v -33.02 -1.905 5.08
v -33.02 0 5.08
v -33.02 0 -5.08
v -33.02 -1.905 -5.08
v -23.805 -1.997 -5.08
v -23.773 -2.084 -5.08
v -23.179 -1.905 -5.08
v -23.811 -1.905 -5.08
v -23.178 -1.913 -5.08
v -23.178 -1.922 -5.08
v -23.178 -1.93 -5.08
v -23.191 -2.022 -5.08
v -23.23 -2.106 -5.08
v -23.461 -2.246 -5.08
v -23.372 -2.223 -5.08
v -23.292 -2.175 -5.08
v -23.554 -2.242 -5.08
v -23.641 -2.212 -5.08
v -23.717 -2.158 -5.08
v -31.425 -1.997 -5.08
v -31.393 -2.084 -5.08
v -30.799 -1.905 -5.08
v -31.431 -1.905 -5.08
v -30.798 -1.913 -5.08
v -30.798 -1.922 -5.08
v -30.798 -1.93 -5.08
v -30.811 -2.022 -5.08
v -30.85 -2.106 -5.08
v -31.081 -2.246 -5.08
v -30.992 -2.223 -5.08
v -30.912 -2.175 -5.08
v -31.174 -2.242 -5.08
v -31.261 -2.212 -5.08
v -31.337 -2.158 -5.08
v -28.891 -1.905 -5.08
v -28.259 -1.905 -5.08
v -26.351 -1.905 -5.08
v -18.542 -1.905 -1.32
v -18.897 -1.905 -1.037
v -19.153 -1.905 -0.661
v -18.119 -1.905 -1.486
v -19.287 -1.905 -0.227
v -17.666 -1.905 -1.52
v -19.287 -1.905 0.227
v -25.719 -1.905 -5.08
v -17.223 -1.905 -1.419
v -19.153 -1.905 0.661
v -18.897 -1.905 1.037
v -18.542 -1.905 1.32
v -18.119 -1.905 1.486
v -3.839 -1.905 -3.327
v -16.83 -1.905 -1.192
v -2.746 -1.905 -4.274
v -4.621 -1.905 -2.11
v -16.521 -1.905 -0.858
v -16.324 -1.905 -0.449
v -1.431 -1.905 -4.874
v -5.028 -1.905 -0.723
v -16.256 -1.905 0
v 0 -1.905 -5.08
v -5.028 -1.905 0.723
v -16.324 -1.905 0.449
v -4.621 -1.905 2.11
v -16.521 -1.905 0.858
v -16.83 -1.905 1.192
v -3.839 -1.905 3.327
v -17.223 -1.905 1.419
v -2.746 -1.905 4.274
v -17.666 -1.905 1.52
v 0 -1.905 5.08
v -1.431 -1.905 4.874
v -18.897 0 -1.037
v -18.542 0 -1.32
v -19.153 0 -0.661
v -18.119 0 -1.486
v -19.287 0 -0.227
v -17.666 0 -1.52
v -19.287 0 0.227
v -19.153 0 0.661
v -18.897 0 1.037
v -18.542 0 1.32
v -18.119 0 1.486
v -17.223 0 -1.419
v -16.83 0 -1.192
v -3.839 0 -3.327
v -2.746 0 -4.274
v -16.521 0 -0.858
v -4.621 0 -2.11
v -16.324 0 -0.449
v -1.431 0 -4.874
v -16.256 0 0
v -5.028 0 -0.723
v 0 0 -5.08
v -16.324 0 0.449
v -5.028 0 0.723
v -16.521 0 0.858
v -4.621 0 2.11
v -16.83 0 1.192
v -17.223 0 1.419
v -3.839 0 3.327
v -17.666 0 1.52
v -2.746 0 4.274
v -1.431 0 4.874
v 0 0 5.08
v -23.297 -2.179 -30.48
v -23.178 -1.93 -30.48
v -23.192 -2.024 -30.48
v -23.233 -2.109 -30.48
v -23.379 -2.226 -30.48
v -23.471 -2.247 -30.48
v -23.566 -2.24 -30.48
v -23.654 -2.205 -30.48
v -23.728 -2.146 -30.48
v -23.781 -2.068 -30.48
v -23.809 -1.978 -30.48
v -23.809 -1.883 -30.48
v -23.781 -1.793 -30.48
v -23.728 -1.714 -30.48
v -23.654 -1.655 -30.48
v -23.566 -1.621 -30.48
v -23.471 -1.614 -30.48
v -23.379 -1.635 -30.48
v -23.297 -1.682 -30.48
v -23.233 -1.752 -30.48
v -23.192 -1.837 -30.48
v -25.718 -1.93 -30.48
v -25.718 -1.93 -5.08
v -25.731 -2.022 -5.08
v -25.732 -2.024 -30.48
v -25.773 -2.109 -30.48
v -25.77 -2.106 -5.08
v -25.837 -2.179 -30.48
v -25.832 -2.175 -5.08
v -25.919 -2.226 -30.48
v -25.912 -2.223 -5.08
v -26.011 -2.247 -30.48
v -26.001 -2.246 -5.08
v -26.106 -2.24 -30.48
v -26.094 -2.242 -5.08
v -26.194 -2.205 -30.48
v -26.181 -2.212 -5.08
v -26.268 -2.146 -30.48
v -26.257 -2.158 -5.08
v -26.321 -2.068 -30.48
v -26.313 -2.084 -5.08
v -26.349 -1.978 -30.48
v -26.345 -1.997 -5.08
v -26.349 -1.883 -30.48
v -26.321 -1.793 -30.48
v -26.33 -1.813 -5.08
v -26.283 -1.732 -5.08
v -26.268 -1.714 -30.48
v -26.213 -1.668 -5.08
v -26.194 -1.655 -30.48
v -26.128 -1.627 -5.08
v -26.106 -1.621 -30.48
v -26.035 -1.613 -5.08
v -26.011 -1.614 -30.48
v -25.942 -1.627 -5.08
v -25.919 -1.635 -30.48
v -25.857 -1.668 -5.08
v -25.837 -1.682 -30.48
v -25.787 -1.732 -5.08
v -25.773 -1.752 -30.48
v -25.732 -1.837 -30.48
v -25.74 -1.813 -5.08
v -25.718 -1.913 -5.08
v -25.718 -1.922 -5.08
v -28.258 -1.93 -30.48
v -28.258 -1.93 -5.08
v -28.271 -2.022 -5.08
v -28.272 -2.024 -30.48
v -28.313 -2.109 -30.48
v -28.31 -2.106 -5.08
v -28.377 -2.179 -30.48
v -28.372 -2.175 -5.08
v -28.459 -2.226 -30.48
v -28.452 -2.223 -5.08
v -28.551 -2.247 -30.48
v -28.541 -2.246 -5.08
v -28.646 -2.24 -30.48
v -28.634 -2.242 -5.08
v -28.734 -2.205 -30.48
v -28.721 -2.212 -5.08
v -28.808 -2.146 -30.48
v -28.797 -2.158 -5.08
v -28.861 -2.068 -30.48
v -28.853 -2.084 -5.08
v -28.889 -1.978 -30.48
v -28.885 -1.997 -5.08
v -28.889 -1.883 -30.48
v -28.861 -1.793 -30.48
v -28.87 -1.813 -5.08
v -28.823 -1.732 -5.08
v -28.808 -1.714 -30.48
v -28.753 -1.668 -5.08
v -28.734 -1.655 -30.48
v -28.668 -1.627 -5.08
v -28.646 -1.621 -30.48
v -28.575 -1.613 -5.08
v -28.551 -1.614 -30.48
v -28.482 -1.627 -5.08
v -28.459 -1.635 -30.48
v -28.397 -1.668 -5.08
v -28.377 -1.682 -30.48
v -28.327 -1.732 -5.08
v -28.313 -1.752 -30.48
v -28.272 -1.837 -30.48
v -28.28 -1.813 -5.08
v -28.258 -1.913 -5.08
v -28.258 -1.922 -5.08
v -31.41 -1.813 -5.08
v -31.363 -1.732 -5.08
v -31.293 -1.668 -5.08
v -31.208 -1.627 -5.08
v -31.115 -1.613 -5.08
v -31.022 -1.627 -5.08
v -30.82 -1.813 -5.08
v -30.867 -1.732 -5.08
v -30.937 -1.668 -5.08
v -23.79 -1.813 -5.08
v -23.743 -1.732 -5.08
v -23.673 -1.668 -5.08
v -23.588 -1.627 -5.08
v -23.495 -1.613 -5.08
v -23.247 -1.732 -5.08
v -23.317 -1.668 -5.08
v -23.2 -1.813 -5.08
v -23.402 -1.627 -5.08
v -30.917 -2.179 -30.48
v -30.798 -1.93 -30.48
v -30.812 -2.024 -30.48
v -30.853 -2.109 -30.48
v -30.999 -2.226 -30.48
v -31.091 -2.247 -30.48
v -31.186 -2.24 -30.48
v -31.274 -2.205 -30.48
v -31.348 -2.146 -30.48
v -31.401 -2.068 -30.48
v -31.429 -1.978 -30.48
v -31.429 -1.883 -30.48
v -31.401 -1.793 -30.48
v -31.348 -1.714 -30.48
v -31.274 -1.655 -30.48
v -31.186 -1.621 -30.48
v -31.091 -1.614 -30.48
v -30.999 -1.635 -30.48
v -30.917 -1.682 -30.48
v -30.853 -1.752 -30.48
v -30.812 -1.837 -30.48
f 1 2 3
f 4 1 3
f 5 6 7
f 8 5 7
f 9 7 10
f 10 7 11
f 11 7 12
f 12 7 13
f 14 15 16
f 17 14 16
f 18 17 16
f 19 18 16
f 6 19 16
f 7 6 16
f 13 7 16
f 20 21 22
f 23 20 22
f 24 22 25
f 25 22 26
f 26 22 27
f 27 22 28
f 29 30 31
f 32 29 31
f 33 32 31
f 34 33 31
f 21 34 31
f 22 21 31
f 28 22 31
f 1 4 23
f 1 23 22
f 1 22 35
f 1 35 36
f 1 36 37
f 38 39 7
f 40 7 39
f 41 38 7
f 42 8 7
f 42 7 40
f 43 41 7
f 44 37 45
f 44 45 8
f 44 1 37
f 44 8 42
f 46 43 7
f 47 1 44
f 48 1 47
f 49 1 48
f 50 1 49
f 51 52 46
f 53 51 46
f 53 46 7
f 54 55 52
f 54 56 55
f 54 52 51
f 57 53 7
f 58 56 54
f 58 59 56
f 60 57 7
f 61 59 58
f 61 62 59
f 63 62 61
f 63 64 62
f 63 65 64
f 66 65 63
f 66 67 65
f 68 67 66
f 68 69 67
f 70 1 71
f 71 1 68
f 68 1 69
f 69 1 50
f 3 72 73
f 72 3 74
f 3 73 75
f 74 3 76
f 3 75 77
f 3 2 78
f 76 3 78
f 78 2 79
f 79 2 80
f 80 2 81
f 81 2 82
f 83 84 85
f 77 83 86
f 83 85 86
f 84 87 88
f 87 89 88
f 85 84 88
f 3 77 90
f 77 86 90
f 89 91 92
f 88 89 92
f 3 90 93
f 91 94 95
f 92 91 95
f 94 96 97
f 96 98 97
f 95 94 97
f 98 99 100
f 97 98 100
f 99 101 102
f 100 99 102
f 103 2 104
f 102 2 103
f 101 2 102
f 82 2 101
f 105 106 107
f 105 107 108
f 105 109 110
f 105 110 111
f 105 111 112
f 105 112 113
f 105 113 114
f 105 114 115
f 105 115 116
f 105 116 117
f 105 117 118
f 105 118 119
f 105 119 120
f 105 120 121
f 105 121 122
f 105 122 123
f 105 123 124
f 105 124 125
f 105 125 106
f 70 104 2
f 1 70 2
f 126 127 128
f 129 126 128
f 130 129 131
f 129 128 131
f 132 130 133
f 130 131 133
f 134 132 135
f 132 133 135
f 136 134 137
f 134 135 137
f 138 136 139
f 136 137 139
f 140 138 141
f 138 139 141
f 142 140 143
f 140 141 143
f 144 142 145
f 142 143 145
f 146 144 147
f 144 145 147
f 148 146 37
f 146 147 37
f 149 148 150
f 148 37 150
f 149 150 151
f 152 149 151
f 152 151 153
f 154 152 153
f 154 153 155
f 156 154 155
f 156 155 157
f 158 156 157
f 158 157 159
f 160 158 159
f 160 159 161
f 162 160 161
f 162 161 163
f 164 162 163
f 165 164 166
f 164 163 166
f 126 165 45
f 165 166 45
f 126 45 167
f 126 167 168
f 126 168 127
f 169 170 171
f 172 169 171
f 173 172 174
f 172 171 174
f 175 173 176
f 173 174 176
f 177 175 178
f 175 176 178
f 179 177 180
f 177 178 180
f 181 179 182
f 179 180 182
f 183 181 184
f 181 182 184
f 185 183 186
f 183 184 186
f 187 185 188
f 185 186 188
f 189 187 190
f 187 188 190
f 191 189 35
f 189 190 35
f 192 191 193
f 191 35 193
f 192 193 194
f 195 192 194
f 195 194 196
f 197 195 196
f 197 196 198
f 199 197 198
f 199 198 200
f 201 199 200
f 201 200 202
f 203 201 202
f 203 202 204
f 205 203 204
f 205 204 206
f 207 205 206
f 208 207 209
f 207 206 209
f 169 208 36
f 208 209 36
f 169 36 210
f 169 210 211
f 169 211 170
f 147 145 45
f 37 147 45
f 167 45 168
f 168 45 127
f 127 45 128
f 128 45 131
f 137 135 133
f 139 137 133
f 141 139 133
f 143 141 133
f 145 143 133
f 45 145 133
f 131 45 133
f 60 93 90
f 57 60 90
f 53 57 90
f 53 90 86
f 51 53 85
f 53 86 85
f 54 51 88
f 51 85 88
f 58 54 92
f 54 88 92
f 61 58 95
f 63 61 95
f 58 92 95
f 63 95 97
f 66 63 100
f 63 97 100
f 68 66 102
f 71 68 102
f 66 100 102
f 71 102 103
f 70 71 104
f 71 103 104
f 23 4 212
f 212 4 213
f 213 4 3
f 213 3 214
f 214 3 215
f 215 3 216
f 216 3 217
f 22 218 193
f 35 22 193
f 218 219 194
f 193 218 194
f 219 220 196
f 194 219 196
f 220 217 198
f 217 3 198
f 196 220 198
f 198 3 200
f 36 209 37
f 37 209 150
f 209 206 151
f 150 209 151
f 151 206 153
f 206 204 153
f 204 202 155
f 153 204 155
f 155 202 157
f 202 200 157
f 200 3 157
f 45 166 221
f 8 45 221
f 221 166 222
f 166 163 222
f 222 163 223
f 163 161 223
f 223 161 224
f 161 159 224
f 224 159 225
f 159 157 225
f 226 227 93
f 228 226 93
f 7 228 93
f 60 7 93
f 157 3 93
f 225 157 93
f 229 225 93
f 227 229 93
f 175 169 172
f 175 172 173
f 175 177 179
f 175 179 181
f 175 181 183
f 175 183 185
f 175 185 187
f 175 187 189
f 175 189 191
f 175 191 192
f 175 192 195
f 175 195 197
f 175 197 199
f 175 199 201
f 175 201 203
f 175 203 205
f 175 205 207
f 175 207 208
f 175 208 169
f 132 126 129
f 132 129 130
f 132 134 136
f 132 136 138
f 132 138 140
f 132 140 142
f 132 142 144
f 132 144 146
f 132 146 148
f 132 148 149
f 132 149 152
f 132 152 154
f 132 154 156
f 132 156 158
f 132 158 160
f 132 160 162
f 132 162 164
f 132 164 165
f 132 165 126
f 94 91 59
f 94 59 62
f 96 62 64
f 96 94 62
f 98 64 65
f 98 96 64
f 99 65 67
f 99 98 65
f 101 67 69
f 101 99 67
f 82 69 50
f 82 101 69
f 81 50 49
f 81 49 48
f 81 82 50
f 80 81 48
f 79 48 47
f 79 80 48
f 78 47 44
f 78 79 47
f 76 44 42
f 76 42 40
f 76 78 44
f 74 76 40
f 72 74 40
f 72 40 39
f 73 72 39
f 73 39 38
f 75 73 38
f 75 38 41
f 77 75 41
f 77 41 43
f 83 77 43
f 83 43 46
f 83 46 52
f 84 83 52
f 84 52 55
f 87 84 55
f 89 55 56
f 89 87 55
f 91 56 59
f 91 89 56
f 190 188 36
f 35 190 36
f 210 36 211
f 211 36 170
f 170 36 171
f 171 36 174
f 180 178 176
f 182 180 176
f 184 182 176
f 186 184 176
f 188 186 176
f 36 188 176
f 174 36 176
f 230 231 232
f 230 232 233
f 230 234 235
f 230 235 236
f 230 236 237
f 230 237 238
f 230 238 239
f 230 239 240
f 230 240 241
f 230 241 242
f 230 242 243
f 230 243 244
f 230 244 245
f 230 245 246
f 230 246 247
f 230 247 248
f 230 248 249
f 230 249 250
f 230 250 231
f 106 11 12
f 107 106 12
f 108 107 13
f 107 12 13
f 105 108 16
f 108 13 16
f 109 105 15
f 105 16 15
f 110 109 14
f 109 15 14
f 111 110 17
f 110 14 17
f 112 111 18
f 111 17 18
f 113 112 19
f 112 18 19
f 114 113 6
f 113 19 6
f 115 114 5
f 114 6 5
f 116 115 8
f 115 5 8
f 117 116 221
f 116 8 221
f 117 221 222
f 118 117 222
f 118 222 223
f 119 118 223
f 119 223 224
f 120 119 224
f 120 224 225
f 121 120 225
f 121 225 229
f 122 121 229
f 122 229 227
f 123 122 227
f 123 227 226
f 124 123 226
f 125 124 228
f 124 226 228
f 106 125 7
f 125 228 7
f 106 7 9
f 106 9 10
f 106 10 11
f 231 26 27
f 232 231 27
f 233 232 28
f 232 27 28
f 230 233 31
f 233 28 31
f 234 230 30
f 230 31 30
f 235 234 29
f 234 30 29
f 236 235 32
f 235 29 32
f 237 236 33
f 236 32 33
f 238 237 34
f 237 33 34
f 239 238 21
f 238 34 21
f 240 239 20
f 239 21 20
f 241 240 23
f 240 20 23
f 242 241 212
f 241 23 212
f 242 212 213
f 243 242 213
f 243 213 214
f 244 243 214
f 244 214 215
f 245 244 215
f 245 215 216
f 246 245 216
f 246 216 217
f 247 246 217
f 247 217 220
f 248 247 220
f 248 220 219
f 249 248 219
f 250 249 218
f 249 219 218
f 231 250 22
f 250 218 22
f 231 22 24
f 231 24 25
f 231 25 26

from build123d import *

# Parameters (mm, degrees)
F0_R     = 1.524
F1_DEPTH = 1.905
F2_R     = 0.3175
F3_DEPTH = 25.4
F4_R     = 5.08
F5_DEPTH = 3.83728


with BuildPart() as f1:
    # F0 (on Front) → F1 (new body)
    with BuildSketch(Plane.XZ):
        with BuildLine():
            ThreePointArc((0, -5.08), (3.592102, -3.592102), (5.08, 0))
            ThreePointArc((5.08, 0), (3.592102, 3.592102), (0, 5.08))
            Line((0, 5.08), (0, -5.08))
        make_face()
        with BuildLine():
            ThreePointArc((0, -5.08), (-5.08, 0), (0, 5.08))
            Line((0, 5.08), (-33.02, 5.08))
            Line((-33.02, 5.08), (-33.02, -5.08))
            Line((-33.02, -5.08), (0, -5.08))
        make_face()
        with Locations((-17.78, 0)):
            Circle(F0_R, mode=Mode.SUBTRACT)
    extrude(amount=F1_DEPTH)

    # F2 (on face) → F3 (join)
    with BuildSketch(Plane(origin=(0, 0, -5.08), x_dir=(1, 0, 0), z_dir=(0, 0, -1))):
        with Locations((-31.115, 1.9304)):
            Circle(F2_R)
        with Locations((-28.575, 1.9304)):
            Circle(F2_R)
        with Locations((-26.035, 1.9304)):
            Circle(F2_R)
        with Locations((-23.495, 1.9304)):
            Circle(F2_R)
    extrude(amount=F3_DEPTH)

    # F4 (on face) → F5 (cut)
    with BuildSketch(Plane(origin=(0, 0, 0), x_dir=(-1, 0, 0), z_dir=(0, 1, 0))):
        Circle(F4_R)
    extrude(amount=-F5_DEPTH, mode=Mode.SUBTRACT)


solid = f1.part
